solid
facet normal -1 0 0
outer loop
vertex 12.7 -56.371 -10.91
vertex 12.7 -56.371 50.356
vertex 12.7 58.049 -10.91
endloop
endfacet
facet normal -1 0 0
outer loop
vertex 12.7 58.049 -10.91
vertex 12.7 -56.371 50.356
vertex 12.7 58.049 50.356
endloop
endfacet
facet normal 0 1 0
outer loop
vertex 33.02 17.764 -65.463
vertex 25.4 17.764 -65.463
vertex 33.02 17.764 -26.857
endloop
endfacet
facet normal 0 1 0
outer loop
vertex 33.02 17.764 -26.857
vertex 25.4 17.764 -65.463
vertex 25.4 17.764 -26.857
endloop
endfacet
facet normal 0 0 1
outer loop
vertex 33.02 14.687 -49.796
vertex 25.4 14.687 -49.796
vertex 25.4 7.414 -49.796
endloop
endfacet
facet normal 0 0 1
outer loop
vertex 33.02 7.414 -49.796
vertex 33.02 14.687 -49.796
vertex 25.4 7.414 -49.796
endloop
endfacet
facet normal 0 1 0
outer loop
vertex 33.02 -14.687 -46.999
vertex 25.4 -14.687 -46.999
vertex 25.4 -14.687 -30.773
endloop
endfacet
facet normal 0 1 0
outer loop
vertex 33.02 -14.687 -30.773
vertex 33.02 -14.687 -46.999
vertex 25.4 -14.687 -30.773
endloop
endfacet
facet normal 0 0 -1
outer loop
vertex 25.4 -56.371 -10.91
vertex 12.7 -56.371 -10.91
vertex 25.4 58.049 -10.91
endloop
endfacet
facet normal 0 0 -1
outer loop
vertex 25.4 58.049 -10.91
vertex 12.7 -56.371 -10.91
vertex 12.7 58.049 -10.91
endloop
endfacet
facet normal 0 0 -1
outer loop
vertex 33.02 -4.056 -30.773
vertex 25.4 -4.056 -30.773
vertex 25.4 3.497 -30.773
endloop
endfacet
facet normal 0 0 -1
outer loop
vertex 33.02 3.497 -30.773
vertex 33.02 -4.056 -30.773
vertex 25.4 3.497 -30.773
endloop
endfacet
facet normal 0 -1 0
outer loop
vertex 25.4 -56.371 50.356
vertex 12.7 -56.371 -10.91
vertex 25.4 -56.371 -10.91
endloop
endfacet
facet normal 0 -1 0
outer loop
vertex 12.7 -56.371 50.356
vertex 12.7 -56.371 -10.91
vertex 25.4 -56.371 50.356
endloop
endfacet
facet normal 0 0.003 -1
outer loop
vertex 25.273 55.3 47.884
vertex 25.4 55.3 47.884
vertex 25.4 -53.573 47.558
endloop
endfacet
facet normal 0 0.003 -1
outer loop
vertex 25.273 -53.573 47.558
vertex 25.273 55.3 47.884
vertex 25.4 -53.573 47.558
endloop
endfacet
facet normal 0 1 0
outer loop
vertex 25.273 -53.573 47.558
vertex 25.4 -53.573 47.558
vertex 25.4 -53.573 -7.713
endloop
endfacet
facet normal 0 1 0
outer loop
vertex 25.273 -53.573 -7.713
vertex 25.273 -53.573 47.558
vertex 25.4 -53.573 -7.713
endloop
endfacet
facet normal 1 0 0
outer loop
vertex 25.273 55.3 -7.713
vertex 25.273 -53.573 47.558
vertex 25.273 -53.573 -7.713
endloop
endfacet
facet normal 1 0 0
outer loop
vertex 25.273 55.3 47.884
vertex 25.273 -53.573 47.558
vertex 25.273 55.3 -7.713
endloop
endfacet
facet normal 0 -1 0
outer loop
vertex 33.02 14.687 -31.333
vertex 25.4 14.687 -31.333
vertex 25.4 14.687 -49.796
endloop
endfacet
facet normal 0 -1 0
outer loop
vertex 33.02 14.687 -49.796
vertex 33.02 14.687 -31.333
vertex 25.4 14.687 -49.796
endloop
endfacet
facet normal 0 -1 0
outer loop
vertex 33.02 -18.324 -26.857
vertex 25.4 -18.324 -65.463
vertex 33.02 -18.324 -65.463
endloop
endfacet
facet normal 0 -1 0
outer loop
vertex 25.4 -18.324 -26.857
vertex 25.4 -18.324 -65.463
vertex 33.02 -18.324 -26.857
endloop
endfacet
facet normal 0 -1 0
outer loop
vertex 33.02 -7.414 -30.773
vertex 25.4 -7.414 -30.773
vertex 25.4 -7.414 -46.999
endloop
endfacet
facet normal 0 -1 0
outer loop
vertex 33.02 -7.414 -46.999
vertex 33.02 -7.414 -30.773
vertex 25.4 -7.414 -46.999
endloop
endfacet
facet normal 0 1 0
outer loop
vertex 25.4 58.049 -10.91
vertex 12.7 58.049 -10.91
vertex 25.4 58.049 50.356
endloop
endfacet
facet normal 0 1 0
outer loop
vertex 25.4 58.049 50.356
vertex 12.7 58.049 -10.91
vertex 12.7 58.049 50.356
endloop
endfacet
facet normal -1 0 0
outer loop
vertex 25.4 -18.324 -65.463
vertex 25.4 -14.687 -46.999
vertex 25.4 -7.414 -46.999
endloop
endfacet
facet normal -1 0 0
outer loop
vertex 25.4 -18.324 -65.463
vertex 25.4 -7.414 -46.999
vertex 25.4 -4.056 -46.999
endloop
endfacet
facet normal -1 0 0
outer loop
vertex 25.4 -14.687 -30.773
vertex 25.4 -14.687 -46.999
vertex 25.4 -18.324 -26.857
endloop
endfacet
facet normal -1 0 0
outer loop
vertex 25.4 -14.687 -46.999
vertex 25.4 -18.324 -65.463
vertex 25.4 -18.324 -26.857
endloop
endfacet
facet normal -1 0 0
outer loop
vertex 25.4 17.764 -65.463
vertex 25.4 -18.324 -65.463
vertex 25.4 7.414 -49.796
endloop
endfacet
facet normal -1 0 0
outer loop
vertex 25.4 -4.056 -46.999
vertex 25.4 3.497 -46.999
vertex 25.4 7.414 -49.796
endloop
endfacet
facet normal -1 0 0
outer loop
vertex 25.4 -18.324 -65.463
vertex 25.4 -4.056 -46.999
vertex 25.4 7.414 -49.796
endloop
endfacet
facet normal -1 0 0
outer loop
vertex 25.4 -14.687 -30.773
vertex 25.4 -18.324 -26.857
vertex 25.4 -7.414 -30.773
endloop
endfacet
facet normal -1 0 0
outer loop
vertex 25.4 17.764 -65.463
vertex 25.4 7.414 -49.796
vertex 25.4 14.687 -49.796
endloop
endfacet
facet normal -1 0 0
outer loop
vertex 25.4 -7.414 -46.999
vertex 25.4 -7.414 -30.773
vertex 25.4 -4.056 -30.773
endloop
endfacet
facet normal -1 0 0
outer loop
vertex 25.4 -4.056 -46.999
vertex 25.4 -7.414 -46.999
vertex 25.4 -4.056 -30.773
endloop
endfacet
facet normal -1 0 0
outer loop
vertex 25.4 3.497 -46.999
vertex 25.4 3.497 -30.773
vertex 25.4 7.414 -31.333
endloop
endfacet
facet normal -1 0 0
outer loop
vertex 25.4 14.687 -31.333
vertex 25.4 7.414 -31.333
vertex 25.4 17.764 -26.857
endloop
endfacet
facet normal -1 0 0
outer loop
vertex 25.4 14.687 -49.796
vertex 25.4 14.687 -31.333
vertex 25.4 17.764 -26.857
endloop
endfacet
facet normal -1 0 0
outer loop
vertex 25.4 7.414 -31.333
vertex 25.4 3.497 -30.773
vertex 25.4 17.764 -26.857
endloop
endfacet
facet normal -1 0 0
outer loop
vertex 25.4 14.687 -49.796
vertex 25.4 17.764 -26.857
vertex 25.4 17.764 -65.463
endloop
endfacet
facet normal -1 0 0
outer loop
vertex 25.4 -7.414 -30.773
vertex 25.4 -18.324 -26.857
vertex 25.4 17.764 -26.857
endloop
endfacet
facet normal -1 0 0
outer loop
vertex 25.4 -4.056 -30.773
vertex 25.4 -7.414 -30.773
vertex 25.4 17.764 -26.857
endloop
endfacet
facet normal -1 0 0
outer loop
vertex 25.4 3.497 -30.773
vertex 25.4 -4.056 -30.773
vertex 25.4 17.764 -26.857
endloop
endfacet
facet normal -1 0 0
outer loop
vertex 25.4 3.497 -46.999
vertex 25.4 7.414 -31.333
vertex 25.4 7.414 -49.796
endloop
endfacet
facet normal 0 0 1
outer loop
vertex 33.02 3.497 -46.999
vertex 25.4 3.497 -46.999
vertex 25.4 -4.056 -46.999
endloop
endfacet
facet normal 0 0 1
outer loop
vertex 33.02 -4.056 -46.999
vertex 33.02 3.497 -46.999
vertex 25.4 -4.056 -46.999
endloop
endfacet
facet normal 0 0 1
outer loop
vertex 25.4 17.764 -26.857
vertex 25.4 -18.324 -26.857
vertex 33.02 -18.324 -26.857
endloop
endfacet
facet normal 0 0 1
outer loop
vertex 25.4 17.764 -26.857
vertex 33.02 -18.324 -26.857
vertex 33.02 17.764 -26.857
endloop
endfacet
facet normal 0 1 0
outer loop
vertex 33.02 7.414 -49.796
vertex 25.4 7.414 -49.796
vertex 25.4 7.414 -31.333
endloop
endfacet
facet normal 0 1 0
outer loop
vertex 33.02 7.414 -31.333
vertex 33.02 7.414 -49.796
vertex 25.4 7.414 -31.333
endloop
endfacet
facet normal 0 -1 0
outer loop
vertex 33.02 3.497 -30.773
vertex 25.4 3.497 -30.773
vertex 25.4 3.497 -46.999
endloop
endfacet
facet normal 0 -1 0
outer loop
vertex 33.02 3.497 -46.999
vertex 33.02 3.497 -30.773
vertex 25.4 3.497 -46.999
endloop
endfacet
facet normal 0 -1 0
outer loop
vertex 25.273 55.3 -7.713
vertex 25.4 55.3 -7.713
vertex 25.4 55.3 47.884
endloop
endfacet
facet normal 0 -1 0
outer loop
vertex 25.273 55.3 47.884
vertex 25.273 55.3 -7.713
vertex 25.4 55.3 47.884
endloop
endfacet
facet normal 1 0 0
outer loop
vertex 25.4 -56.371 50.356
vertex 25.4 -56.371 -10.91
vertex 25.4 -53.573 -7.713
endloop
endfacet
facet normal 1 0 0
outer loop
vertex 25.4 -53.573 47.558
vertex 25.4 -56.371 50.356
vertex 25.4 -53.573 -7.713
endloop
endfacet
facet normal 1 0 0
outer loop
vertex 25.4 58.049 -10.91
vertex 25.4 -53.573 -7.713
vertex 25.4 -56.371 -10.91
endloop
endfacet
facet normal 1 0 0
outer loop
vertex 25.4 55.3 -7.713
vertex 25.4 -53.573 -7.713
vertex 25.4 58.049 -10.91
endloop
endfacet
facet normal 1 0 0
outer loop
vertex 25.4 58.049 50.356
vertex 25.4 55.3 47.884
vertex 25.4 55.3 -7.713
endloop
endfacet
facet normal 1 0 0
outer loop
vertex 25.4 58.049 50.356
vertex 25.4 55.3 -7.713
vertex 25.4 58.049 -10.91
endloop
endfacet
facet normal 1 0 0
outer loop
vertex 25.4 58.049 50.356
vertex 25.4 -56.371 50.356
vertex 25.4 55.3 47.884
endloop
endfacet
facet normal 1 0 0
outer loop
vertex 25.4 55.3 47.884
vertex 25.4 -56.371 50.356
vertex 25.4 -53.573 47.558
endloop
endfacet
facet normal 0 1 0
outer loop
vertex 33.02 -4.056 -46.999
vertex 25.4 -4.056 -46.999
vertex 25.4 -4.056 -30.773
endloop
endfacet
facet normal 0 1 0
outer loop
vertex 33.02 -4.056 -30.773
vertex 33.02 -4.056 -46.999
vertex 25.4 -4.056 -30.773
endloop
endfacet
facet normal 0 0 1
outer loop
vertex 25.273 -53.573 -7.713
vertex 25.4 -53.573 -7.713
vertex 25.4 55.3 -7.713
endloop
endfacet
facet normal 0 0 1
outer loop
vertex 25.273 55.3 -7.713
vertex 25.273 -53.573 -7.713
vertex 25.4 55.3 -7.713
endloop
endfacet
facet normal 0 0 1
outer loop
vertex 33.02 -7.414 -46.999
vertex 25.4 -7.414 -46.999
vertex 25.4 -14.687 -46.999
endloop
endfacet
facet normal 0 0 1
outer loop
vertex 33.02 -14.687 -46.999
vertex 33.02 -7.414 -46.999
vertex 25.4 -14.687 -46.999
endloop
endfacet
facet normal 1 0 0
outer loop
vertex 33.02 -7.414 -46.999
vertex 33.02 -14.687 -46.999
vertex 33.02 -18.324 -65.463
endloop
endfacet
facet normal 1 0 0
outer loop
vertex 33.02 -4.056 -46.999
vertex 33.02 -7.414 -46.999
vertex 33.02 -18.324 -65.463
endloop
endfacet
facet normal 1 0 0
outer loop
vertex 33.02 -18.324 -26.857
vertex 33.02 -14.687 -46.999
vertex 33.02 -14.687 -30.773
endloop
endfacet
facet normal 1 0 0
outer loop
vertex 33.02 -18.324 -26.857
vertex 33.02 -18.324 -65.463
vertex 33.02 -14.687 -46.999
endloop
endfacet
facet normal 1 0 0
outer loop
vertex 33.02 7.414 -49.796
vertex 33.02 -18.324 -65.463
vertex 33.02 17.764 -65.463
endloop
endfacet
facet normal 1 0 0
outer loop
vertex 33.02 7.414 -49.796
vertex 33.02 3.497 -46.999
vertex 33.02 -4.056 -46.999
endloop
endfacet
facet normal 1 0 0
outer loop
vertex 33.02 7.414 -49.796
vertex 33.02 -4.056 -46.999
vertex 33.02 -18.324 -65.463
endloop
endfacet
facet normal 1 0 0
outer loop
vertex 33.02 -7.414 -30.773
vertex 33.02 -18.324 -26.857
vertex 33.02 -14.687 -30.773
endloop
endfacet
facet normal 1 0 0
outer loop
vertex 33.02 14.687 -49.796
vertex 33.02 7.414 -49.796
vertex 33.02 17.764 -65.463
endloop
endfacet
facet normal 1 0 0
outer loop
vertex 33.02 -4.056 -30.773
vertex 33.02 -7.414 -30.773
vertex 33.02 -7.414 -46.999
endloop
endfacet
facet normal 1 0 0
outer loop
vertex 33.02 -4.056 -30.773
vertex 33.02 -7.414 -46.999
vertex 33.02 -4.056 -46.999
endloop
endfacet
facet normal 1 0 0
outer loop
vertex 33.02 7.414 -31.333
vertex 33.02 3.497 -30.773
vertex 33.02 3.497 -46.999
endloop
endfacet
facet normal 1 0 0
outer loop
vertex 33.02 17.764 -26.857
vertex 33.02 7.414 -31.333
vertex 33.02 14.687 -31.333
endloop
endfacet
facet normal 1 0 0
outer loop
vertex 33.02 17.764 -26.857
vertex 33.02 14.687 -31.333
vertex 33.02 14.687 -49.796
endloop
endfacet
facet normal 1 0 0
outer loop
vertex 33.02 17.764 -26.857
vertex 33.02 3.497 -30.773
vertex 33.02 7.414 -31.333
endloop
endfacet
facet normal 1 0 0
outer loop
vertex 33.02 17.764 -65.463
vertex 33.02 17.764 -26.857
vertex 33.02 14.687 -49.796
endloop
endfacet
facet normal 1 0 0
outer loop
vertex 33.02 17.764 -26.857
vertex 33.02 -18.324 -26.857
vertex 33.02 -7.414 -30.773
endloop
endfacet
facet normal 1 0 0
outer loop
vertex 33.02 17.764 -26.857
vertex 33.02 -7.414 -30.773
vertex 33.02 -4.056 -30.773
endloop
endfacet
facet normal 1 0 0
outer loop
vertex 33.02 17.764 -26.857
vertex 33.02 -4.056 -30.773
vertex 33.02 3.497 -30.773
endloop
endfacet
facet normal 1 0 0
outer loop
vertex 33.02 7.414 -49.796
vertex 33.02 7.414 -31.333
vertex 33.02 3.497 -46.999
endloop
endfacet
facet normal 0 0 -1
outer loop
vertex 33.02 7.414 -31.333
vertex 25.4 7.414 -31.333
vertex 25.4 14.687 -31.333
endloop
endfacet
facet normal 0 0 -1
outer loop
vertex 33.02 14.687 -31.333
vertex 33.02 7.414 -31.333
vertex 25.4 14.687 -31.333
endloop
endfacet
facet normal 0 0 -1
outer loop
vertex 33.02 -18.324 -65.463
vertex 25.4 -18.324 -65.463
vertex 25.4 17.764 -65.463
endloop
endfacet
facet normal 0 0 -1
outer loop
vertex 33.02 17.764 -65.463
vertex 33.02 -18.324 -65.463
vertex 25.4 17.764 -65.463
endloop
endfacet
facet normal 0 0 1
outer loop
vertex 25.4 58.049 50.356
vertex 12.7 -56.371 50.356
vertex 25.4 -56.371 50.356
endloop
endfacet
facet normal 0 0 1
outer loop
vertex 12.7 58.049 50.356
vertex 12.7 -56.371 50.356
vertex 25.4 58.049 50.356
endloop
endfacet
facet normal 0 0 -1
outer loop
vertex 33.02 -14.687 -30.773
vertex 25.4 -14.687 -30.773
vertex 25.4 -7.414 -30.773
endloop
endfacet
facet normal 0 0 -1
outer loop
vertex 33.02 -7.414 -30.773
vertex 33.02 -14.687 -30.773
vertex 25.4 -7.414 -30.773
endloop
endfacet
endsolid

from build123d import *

# Parameters (mm, degrees)
F0_W     = 114.4198961556
F0_H     = 61.26639992
F1_DEPTH = 25.4
F2_DEPTH = 12.7
F3_W     = 36.0884238034
F3_H     = 38.6062264442
F4_DEPTH = 7.62
F5_DEPTH = 25.4
F6_DEPTH = 25.4
F8_DEPTH = 0.127


with BuildPart() as f1:
    # F0 (on Right) → F1 (new body)
    with BuildSketch(Plane.YZ):
        with Locations((0.8392650634, 19.7227448225)):
            Rectangle(F0_W, F0_H)
    extrude(amount=F1_DEPTH)

    # F2 (cut): a face of the model
    f2_faces = [f1.faces().sort_by_distance(p)[0] for p in [
        (0, 0.8392650634, 19.7227448225),
    ]]
    extrude(f2_faces, amount=-F2_DEPTH, mode=Mode.SUBTRACT)

    # F7 (on face) → F8 (cut)
    with BuildSketch(Plane.YZ.offset(25.4)):
        Polygon((55.2995614707, 47.8838682175), (-53.573127836, 47.5583933294), (-53.573127836, -7.7127907425), (55.2995614707, -7.7127907425), align=None)
    extrude(amount=-F8_DEPTH, mode=Mode.SUBTRACT)


with BuildPart() as f4:
    # F3 (on Right) → F4 (new body)
    with BuildSketch(Plane.YZ):
        with Locations((-0.2797553316, -46.1596176028)):
            Rectangle(F3_W, F3_H)
        Polygon((-14.6871525794, -30.7730771601), (-7.4135130271, -30.7730771601), (-7.4135130271, -46.9988808036), (-11.0503328033, -46.9988808036), (-14.6871525794, -46.9988808036), align=None, mode=Mode.SUBTRACT)
        Polygon((-4.0564504452, -30.7730771601), (3.496941179, -30.7730771601), (3.496941179, -46.9988808036), (0, -46.9988808036), (-4.0564504452, -46.9988808036), align=None, mode=Mode.SUBTRACT)
        Polygon((7.4135130271, -31.3325859606), (14.6871497855, -31.3325859606), (14.6871497855, -49.796435982), (11.0503314063, -49.796435982), (7.4135130271, -49.796435982), align=None, mode=Mode.SUBTRACT)
    extrude(amount=F4_DEPTH)

    # F5 (add): a face of the model
    f5_faces = [f4.faces().sort_by_distance(p)[0] for p in [
        (7.62, -0.5257127517, -48.6158408986),
    ]]
    extrude(f5_faces, amount=F5_DEPTH)

    # F6 (cut): a face of the model
    f6_faces = [f4.faces().sort_by_distance(p)[0] for p in [
        (0, -0.5257127517, -48.6158408986),
    ]]
    extrude(f6_faces, amount=-F6_DEPTH, mode=Mode.SUBTRACT)


solid = Compound([f1.part, f4.part])
